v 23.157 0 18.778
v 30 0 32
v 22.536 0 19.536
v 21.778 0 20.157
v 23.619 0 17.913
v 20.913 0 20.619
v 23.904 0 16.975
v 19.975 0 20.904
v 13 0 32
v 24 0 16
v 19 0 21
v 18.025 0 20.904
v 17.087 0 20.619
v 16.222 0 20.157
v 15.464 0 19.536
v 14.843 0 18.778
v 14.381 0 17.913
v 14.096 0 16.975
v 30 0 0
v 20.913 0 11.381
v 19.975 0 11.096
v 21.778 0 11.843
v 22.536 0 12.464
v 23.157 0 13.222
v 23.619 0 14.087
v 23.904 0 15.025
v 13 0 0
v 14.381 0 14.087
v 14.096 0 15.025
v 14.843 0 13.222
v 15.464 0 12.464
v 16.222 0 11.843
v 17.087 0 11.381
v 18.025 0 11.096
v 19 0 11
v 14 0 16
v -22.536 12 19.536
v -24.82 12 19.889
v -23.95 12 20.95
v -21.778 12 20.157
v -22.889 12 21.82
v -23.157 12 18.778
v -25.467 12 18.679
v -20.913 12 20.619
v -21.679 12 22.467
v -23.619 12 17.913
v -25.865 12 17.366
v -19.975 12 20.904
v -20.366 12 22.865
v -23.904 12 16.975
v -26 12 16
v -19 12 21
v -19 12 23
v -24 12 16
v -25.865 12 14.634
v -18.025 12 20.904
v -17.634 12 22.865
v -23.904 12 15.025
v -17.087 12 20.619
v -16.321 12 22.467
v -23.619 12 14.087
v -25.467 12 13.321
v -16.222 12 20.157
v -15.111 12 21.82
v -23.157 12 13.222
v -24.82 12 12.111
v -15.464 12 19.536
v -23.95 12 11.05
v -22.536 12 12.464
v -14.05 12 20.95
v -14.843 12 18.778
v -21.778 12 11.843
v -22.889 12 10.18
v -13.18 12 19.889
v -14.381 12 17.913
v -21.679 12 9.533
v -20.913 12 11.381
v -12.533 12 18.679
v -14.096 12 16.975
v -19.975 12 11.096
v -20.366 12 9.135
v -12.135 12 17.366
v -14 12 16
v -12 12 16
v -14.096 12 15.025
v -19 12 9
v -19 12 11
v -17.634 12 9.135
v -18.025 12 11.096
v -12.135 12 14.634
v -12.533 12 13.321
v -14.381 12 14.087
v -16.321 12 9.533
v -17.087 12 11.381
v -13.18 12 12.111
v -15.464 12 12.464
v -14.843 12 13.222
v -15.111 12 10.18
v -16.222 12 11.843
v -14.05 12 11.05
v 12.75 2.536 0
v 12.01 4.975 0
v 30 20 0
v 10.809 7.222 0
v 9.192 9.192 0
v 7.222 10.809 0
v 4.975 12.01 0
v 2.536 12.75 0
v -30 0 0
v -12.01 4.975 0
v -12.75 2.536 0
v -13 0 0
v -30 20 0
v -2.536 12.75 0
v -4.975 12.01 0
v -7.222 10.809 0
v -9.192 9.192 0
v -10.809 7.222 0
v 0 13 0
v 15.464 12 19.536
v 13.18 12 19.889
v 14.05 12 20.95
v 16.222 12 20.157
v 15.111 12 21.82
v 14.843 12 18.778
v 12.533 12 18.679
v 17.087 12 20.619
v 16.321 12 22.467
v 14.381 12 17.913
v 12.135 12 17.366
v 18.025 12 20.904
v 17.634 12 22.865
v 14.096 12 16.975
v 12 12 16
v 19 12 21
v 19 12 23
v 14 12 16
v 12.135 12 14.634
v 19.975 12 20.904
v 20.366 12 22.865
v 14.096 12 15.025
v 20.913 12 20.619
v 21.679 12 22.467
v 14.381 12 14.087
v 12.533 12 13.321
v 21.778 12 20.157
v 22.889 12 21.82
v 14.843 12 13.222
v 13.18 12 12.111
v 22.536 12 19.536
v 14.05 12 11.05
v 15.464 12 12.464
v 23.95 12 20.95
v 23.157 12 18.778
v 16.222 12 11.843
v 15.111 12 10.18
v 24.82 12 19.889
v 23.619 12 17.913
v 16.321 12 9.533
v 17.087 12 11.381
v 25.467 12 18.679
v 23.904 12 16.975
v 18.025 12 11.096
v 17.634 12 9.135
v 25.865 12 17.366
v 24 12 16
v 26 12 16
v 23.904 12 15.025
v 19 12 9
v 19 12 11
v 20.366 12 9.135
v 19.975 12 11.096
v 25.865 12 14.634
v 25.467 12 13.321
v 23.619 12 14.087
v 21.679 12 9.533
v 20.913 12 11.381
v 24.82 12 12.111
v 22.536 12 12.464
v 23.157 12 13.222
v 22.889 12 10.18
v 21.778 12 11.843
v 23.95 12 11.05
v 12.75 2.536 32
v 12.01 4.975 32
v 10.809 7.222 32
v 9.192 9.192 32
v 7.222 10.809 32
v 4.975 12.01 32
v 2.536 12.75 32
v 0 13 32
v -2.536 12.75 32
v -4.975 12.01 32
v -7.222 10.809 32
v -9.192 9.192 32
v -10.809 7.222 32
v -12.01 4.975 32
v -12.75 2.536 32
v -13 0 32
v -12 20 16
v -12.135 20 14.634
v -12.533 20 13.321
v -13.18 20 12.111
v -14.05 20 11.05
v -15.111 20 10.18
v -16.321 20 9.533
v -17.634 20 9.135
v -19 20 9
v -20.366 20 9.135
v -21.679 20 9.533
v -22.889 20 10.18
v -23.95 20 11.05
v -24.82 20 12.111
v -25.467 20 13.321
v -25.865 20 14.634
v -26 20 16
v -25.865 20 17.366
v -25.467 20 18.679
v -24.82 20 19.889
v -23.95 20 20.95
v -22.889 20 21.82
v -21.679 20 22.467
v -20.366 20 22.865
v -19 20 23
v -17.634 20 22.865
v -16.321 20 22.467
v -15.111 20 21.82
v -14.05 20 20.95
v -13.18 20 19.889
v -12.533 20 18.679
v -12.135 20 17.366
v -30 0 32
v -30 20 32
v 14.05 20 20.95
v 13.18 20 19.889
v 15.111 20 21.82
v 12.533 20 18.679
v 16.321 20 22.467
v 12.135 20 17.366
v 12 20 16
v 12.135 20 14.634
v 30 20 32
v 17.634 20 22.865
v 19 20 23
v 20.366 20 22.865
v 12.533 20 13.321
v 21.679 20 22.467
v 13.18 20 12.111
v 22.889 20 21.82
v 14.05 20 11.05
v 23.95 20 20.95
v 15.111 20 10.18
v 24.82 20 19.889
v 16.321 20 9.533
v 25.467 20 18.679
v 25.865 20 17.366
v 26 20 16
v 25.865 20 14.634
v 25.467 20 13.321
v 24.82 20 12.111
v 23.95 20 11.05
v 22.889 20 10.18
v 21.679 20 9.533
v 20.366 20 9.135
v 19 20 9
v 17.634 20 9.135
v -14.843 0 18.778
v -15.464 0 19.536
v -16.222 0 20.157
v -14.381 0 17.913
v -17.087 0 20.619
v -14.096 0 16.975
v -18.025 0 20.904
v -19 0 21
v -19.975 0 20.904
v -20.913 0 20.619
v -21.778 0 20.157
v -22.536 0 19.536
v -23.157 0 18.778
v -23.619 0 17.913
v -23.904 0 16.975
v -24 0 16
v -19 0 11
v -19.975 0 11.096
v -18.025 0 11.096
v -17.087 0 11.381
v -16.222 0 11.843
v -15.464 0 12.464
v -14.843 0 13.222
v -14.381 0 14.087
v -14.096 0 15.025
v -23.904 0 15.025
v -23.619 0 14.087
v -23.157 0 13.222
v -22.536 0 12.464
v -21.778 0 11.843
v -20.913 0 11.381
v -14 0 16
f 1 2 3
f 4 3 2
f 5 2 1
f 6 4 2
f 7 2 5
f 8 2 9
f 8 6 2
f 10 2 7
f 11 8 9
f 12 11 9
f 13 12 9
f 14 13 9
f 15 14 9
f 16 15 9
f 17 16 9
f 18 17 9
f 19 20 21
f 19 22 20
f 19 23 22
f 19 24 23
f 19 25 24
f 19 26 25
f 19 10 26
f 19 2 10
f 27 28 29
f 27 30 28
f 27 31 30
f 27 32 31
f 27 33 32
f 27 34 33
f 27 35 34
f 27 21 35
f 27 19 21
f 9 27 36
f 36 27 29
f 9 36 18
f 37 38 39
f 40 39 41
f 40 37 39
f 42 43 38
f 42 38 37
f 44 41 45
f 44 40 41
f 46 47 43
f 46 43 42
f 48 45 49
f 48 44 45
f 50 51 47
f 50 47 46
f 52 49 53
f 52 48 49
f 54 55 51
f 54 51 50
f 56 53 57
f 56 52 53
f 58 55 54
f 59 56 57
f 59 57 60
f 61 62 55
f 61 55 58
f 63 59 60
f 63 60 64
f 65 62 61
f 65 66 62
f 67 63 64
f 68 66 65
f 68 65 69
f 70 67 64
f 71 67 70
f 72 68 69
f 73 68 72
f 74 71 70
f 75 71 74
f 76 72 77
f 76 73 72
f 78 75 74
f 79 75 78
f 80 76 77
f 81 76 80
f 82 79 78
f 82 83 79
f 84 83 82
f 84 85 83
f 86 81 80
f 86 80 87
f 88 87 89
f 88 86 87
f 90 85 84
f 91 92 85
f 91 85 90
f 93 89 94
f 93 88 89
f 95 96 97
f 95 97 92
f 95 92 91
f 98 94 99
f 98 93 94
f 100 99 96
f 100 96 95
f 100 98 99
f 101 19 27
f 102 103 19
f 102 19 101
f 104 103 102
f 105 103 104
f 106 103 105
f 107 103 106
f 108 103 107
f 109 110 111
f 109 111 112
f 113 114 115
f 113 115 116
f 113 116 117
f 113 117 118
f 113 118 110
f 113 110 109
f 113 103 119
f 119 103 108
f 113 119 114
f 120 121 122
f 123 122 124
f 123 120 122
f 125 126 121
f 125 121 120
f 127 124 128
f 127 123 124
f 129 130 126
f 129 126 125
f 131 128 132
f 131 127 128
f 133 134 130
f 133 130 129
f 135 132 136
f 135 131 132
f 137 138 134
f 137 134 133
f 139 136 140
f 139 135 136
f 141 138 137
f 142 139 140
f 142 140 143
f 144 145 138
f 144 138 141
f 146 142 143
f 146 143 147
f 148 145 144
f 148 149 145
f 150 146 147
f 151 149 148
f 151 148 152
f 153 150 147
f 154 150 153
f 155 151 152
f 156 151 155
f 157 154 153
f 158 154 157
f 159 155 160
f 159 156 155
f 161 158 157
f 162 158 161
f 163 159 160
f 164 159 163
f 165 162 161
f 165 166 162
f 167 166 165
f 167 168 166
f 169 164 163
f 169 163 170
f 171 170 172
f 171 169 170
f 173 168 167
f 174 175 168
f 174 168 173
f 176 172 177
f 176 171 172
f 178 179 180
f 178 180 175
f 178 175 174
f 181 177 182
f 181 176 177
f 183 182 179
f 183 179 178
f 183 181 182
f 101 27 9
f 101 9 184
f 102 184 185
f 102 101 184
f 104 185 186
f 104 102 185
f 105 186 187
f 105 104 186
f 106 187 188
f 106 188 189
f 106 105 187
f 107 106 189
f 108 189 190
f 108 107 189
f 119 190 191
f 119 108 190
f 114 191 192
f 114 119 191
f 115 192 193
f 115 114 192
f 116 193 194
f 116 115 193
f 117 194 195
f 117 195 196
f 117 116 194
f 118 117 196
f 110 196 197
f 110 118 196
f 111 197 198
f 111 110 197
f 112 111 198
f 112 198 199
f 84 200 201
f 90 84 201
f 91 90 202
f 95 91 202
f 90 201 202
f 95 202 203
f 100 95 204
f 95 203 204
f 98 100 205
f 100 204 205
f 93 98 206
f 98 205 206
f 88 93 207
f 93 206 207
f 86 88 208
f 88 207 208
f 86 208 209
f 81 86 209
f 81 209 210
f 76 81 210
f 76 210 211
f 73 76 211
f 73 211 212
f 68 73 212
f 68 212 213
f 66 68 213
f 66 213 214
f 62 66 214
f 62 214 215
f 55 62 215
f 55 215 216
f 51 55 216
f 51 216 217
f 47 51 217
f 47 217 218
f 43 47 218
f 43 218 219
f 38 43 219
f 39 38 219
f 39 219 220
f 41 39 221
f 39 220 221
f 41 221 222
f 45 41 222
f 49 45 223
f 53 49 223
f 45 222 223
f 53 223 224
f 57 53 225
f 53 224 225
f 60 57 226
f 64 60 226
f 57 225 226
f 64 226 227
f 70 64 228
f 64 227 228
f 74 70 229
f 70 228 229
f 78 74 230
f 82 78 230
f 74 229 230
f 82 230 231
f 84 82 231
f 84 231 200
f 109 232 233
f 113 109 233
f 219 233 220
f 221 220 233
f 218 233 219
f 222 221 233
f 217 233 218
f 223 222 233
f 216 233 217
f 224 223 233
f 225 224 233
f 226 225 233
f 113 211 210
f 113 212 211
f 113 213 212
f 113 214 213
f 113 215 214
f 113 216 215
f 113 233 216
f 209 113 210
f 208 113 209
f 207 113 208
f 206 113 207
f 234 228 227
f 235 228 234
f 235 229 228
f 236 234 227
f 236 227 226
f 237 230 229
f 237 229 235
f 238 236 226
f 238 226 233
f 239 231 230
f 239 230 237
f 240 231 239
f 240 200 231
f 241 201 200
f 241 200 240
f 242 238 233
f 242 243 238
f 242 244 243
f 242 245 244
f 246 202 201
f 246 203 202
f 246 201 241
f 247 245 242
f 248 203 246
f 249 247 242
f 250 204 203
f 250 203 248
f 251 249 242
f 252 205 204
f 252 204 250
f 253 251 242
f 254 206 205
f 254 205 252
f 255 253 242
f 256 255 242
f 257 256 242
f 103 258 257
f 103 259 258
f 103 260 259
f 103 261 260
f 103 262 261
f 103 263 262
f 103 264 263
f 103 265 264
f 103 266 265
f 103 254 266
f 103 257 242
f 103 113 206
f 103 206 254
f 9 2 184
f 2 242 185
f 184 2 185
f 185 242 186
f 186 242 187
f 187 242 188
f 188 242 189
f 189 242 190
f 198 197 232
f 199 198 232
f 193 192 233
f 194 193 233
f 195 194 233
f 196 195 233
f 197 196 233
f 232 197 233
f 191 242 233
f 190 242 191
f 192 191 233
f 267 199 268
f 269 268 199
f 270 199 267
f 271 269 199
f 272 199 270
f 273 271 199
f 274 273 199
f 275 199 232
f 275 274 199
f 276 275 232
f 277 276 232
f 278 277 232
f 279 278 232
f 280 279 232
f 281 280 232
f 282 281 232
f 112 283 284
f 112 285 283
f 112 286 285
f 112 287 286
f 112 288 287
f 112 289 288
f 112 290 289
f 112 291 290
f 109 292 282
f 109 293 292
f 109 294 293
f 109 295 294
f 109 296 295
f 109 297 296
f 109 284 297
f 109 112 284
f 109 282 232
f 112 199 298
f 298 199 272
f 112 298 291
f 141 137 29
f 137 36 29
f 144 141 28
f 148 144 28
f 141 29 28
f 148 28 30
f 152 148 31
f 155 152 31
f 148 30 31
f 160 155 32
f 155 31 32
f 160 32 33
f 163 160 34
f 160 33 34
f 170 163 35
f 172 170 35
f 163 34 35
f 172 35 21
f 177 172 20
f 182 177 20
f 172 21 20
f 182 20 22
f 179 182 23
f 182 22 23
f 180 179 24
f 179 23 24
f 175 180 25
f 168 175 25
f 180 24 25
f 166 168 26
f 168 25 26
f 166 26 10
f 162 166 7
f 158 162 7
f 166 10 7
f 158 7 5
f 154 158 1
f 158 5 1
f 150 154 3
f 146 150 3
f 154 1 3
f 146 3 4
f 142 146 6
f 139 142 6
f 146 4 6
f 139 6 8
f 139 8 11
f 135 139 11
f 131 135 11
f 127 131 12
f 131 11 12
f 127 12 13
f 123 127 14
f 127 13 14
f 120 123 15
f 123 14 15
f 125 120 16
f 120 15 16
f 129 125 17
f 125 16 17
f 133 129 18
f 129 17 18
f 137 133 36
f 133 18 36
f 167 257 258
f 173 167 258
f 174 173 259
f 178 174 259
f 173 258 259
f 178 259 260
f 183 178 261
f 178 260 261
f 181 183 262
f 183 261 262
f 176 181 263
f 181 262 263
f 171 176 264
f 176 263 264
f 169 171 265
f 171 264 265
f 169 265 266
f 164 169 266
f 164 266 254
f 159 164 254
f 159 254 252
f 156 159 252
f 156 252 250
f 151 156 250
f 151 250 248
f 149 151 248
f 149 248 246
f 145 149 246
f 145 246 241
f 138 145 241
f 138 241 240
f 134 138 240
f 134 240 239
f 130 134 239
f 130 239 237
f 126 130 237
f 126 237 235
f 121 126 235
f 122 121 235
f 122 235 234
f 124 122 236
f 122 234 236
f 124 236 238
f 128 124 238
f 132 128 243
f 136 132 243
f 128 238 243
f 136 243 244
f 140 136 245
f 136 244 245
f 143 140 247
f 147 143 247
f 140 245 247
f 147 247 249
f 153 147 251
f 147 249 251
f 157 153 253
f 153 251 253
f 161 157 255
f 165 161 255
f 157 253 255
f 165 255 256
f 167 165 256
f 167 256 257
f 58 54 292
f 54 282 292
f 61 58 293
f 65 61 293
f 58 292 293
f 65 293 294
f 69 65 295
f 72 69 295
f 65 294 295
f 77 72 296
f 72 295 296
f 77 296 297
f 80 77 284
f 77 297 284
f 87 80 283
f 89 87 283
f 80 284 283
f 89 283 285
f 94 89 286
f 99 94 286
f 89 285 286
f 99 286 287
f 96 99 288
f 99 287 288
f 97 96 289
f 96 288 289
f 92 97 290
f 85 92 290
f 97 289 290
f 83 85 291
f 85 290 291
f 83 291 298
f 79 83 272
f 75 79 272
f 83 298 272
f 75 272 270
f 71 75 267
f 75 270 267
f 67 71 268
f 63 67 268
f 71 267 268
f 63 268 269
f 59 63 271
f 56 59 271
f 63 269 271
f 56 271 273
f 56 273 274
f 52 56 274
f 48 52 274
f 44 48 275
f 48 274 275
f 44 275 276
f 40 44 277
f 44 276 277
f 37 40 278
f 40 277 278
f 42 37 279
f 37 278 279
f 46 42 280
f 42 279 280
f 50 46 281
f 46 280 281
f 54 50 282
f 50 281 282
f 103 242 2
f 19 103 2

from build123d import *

# Parameters (mm, degrees)
BOSS_EXTRUDE1_DEPTH            = 32
CBORE_FOR_M8_SHCS1_D           = 10
CBORE_FOR_M8_SHCS1_CBORE_D     = 14
CBORE_FOR_M8_SHCS1_CBORE_DEPTH = 8


with BuildPart() as part:
    # Sketch1 → Boss-Extrude1 (new body)
    with BuildSketch(Plane.XY):
        with BuildLine():
            Line((-13, 0), (-30, 0))
            Line((-30, 0), (-30, 20))
            Line((-30, 20), (30, 20))
            Line((30, 20), (30, 0))
            Line((30, 0), (13, 0))
            ThreePointArc((13, 0), (0, 13), (-13, 0))
        make_face()
    extrude(amount=BOSS_EXTRUDE1_DEPTH)

    # CBORE for M8 SHCS1 (through all)
    with Locations(Plane(origin=(0, 20, 0), x_dir=(1, 0, 0), z_dir=(0, 1, 0))):
        with Locations((-19, -16), (19, -16)):
            CounterBoreHole(CBORE_FOR_M8_SHCS1_D / 2, CBORE_FOR_M8_SHCS1_CBORE_D / 2, CBORE_FOR_M8_SHCS1_CBORE_DEPTH)


solid = part.part
